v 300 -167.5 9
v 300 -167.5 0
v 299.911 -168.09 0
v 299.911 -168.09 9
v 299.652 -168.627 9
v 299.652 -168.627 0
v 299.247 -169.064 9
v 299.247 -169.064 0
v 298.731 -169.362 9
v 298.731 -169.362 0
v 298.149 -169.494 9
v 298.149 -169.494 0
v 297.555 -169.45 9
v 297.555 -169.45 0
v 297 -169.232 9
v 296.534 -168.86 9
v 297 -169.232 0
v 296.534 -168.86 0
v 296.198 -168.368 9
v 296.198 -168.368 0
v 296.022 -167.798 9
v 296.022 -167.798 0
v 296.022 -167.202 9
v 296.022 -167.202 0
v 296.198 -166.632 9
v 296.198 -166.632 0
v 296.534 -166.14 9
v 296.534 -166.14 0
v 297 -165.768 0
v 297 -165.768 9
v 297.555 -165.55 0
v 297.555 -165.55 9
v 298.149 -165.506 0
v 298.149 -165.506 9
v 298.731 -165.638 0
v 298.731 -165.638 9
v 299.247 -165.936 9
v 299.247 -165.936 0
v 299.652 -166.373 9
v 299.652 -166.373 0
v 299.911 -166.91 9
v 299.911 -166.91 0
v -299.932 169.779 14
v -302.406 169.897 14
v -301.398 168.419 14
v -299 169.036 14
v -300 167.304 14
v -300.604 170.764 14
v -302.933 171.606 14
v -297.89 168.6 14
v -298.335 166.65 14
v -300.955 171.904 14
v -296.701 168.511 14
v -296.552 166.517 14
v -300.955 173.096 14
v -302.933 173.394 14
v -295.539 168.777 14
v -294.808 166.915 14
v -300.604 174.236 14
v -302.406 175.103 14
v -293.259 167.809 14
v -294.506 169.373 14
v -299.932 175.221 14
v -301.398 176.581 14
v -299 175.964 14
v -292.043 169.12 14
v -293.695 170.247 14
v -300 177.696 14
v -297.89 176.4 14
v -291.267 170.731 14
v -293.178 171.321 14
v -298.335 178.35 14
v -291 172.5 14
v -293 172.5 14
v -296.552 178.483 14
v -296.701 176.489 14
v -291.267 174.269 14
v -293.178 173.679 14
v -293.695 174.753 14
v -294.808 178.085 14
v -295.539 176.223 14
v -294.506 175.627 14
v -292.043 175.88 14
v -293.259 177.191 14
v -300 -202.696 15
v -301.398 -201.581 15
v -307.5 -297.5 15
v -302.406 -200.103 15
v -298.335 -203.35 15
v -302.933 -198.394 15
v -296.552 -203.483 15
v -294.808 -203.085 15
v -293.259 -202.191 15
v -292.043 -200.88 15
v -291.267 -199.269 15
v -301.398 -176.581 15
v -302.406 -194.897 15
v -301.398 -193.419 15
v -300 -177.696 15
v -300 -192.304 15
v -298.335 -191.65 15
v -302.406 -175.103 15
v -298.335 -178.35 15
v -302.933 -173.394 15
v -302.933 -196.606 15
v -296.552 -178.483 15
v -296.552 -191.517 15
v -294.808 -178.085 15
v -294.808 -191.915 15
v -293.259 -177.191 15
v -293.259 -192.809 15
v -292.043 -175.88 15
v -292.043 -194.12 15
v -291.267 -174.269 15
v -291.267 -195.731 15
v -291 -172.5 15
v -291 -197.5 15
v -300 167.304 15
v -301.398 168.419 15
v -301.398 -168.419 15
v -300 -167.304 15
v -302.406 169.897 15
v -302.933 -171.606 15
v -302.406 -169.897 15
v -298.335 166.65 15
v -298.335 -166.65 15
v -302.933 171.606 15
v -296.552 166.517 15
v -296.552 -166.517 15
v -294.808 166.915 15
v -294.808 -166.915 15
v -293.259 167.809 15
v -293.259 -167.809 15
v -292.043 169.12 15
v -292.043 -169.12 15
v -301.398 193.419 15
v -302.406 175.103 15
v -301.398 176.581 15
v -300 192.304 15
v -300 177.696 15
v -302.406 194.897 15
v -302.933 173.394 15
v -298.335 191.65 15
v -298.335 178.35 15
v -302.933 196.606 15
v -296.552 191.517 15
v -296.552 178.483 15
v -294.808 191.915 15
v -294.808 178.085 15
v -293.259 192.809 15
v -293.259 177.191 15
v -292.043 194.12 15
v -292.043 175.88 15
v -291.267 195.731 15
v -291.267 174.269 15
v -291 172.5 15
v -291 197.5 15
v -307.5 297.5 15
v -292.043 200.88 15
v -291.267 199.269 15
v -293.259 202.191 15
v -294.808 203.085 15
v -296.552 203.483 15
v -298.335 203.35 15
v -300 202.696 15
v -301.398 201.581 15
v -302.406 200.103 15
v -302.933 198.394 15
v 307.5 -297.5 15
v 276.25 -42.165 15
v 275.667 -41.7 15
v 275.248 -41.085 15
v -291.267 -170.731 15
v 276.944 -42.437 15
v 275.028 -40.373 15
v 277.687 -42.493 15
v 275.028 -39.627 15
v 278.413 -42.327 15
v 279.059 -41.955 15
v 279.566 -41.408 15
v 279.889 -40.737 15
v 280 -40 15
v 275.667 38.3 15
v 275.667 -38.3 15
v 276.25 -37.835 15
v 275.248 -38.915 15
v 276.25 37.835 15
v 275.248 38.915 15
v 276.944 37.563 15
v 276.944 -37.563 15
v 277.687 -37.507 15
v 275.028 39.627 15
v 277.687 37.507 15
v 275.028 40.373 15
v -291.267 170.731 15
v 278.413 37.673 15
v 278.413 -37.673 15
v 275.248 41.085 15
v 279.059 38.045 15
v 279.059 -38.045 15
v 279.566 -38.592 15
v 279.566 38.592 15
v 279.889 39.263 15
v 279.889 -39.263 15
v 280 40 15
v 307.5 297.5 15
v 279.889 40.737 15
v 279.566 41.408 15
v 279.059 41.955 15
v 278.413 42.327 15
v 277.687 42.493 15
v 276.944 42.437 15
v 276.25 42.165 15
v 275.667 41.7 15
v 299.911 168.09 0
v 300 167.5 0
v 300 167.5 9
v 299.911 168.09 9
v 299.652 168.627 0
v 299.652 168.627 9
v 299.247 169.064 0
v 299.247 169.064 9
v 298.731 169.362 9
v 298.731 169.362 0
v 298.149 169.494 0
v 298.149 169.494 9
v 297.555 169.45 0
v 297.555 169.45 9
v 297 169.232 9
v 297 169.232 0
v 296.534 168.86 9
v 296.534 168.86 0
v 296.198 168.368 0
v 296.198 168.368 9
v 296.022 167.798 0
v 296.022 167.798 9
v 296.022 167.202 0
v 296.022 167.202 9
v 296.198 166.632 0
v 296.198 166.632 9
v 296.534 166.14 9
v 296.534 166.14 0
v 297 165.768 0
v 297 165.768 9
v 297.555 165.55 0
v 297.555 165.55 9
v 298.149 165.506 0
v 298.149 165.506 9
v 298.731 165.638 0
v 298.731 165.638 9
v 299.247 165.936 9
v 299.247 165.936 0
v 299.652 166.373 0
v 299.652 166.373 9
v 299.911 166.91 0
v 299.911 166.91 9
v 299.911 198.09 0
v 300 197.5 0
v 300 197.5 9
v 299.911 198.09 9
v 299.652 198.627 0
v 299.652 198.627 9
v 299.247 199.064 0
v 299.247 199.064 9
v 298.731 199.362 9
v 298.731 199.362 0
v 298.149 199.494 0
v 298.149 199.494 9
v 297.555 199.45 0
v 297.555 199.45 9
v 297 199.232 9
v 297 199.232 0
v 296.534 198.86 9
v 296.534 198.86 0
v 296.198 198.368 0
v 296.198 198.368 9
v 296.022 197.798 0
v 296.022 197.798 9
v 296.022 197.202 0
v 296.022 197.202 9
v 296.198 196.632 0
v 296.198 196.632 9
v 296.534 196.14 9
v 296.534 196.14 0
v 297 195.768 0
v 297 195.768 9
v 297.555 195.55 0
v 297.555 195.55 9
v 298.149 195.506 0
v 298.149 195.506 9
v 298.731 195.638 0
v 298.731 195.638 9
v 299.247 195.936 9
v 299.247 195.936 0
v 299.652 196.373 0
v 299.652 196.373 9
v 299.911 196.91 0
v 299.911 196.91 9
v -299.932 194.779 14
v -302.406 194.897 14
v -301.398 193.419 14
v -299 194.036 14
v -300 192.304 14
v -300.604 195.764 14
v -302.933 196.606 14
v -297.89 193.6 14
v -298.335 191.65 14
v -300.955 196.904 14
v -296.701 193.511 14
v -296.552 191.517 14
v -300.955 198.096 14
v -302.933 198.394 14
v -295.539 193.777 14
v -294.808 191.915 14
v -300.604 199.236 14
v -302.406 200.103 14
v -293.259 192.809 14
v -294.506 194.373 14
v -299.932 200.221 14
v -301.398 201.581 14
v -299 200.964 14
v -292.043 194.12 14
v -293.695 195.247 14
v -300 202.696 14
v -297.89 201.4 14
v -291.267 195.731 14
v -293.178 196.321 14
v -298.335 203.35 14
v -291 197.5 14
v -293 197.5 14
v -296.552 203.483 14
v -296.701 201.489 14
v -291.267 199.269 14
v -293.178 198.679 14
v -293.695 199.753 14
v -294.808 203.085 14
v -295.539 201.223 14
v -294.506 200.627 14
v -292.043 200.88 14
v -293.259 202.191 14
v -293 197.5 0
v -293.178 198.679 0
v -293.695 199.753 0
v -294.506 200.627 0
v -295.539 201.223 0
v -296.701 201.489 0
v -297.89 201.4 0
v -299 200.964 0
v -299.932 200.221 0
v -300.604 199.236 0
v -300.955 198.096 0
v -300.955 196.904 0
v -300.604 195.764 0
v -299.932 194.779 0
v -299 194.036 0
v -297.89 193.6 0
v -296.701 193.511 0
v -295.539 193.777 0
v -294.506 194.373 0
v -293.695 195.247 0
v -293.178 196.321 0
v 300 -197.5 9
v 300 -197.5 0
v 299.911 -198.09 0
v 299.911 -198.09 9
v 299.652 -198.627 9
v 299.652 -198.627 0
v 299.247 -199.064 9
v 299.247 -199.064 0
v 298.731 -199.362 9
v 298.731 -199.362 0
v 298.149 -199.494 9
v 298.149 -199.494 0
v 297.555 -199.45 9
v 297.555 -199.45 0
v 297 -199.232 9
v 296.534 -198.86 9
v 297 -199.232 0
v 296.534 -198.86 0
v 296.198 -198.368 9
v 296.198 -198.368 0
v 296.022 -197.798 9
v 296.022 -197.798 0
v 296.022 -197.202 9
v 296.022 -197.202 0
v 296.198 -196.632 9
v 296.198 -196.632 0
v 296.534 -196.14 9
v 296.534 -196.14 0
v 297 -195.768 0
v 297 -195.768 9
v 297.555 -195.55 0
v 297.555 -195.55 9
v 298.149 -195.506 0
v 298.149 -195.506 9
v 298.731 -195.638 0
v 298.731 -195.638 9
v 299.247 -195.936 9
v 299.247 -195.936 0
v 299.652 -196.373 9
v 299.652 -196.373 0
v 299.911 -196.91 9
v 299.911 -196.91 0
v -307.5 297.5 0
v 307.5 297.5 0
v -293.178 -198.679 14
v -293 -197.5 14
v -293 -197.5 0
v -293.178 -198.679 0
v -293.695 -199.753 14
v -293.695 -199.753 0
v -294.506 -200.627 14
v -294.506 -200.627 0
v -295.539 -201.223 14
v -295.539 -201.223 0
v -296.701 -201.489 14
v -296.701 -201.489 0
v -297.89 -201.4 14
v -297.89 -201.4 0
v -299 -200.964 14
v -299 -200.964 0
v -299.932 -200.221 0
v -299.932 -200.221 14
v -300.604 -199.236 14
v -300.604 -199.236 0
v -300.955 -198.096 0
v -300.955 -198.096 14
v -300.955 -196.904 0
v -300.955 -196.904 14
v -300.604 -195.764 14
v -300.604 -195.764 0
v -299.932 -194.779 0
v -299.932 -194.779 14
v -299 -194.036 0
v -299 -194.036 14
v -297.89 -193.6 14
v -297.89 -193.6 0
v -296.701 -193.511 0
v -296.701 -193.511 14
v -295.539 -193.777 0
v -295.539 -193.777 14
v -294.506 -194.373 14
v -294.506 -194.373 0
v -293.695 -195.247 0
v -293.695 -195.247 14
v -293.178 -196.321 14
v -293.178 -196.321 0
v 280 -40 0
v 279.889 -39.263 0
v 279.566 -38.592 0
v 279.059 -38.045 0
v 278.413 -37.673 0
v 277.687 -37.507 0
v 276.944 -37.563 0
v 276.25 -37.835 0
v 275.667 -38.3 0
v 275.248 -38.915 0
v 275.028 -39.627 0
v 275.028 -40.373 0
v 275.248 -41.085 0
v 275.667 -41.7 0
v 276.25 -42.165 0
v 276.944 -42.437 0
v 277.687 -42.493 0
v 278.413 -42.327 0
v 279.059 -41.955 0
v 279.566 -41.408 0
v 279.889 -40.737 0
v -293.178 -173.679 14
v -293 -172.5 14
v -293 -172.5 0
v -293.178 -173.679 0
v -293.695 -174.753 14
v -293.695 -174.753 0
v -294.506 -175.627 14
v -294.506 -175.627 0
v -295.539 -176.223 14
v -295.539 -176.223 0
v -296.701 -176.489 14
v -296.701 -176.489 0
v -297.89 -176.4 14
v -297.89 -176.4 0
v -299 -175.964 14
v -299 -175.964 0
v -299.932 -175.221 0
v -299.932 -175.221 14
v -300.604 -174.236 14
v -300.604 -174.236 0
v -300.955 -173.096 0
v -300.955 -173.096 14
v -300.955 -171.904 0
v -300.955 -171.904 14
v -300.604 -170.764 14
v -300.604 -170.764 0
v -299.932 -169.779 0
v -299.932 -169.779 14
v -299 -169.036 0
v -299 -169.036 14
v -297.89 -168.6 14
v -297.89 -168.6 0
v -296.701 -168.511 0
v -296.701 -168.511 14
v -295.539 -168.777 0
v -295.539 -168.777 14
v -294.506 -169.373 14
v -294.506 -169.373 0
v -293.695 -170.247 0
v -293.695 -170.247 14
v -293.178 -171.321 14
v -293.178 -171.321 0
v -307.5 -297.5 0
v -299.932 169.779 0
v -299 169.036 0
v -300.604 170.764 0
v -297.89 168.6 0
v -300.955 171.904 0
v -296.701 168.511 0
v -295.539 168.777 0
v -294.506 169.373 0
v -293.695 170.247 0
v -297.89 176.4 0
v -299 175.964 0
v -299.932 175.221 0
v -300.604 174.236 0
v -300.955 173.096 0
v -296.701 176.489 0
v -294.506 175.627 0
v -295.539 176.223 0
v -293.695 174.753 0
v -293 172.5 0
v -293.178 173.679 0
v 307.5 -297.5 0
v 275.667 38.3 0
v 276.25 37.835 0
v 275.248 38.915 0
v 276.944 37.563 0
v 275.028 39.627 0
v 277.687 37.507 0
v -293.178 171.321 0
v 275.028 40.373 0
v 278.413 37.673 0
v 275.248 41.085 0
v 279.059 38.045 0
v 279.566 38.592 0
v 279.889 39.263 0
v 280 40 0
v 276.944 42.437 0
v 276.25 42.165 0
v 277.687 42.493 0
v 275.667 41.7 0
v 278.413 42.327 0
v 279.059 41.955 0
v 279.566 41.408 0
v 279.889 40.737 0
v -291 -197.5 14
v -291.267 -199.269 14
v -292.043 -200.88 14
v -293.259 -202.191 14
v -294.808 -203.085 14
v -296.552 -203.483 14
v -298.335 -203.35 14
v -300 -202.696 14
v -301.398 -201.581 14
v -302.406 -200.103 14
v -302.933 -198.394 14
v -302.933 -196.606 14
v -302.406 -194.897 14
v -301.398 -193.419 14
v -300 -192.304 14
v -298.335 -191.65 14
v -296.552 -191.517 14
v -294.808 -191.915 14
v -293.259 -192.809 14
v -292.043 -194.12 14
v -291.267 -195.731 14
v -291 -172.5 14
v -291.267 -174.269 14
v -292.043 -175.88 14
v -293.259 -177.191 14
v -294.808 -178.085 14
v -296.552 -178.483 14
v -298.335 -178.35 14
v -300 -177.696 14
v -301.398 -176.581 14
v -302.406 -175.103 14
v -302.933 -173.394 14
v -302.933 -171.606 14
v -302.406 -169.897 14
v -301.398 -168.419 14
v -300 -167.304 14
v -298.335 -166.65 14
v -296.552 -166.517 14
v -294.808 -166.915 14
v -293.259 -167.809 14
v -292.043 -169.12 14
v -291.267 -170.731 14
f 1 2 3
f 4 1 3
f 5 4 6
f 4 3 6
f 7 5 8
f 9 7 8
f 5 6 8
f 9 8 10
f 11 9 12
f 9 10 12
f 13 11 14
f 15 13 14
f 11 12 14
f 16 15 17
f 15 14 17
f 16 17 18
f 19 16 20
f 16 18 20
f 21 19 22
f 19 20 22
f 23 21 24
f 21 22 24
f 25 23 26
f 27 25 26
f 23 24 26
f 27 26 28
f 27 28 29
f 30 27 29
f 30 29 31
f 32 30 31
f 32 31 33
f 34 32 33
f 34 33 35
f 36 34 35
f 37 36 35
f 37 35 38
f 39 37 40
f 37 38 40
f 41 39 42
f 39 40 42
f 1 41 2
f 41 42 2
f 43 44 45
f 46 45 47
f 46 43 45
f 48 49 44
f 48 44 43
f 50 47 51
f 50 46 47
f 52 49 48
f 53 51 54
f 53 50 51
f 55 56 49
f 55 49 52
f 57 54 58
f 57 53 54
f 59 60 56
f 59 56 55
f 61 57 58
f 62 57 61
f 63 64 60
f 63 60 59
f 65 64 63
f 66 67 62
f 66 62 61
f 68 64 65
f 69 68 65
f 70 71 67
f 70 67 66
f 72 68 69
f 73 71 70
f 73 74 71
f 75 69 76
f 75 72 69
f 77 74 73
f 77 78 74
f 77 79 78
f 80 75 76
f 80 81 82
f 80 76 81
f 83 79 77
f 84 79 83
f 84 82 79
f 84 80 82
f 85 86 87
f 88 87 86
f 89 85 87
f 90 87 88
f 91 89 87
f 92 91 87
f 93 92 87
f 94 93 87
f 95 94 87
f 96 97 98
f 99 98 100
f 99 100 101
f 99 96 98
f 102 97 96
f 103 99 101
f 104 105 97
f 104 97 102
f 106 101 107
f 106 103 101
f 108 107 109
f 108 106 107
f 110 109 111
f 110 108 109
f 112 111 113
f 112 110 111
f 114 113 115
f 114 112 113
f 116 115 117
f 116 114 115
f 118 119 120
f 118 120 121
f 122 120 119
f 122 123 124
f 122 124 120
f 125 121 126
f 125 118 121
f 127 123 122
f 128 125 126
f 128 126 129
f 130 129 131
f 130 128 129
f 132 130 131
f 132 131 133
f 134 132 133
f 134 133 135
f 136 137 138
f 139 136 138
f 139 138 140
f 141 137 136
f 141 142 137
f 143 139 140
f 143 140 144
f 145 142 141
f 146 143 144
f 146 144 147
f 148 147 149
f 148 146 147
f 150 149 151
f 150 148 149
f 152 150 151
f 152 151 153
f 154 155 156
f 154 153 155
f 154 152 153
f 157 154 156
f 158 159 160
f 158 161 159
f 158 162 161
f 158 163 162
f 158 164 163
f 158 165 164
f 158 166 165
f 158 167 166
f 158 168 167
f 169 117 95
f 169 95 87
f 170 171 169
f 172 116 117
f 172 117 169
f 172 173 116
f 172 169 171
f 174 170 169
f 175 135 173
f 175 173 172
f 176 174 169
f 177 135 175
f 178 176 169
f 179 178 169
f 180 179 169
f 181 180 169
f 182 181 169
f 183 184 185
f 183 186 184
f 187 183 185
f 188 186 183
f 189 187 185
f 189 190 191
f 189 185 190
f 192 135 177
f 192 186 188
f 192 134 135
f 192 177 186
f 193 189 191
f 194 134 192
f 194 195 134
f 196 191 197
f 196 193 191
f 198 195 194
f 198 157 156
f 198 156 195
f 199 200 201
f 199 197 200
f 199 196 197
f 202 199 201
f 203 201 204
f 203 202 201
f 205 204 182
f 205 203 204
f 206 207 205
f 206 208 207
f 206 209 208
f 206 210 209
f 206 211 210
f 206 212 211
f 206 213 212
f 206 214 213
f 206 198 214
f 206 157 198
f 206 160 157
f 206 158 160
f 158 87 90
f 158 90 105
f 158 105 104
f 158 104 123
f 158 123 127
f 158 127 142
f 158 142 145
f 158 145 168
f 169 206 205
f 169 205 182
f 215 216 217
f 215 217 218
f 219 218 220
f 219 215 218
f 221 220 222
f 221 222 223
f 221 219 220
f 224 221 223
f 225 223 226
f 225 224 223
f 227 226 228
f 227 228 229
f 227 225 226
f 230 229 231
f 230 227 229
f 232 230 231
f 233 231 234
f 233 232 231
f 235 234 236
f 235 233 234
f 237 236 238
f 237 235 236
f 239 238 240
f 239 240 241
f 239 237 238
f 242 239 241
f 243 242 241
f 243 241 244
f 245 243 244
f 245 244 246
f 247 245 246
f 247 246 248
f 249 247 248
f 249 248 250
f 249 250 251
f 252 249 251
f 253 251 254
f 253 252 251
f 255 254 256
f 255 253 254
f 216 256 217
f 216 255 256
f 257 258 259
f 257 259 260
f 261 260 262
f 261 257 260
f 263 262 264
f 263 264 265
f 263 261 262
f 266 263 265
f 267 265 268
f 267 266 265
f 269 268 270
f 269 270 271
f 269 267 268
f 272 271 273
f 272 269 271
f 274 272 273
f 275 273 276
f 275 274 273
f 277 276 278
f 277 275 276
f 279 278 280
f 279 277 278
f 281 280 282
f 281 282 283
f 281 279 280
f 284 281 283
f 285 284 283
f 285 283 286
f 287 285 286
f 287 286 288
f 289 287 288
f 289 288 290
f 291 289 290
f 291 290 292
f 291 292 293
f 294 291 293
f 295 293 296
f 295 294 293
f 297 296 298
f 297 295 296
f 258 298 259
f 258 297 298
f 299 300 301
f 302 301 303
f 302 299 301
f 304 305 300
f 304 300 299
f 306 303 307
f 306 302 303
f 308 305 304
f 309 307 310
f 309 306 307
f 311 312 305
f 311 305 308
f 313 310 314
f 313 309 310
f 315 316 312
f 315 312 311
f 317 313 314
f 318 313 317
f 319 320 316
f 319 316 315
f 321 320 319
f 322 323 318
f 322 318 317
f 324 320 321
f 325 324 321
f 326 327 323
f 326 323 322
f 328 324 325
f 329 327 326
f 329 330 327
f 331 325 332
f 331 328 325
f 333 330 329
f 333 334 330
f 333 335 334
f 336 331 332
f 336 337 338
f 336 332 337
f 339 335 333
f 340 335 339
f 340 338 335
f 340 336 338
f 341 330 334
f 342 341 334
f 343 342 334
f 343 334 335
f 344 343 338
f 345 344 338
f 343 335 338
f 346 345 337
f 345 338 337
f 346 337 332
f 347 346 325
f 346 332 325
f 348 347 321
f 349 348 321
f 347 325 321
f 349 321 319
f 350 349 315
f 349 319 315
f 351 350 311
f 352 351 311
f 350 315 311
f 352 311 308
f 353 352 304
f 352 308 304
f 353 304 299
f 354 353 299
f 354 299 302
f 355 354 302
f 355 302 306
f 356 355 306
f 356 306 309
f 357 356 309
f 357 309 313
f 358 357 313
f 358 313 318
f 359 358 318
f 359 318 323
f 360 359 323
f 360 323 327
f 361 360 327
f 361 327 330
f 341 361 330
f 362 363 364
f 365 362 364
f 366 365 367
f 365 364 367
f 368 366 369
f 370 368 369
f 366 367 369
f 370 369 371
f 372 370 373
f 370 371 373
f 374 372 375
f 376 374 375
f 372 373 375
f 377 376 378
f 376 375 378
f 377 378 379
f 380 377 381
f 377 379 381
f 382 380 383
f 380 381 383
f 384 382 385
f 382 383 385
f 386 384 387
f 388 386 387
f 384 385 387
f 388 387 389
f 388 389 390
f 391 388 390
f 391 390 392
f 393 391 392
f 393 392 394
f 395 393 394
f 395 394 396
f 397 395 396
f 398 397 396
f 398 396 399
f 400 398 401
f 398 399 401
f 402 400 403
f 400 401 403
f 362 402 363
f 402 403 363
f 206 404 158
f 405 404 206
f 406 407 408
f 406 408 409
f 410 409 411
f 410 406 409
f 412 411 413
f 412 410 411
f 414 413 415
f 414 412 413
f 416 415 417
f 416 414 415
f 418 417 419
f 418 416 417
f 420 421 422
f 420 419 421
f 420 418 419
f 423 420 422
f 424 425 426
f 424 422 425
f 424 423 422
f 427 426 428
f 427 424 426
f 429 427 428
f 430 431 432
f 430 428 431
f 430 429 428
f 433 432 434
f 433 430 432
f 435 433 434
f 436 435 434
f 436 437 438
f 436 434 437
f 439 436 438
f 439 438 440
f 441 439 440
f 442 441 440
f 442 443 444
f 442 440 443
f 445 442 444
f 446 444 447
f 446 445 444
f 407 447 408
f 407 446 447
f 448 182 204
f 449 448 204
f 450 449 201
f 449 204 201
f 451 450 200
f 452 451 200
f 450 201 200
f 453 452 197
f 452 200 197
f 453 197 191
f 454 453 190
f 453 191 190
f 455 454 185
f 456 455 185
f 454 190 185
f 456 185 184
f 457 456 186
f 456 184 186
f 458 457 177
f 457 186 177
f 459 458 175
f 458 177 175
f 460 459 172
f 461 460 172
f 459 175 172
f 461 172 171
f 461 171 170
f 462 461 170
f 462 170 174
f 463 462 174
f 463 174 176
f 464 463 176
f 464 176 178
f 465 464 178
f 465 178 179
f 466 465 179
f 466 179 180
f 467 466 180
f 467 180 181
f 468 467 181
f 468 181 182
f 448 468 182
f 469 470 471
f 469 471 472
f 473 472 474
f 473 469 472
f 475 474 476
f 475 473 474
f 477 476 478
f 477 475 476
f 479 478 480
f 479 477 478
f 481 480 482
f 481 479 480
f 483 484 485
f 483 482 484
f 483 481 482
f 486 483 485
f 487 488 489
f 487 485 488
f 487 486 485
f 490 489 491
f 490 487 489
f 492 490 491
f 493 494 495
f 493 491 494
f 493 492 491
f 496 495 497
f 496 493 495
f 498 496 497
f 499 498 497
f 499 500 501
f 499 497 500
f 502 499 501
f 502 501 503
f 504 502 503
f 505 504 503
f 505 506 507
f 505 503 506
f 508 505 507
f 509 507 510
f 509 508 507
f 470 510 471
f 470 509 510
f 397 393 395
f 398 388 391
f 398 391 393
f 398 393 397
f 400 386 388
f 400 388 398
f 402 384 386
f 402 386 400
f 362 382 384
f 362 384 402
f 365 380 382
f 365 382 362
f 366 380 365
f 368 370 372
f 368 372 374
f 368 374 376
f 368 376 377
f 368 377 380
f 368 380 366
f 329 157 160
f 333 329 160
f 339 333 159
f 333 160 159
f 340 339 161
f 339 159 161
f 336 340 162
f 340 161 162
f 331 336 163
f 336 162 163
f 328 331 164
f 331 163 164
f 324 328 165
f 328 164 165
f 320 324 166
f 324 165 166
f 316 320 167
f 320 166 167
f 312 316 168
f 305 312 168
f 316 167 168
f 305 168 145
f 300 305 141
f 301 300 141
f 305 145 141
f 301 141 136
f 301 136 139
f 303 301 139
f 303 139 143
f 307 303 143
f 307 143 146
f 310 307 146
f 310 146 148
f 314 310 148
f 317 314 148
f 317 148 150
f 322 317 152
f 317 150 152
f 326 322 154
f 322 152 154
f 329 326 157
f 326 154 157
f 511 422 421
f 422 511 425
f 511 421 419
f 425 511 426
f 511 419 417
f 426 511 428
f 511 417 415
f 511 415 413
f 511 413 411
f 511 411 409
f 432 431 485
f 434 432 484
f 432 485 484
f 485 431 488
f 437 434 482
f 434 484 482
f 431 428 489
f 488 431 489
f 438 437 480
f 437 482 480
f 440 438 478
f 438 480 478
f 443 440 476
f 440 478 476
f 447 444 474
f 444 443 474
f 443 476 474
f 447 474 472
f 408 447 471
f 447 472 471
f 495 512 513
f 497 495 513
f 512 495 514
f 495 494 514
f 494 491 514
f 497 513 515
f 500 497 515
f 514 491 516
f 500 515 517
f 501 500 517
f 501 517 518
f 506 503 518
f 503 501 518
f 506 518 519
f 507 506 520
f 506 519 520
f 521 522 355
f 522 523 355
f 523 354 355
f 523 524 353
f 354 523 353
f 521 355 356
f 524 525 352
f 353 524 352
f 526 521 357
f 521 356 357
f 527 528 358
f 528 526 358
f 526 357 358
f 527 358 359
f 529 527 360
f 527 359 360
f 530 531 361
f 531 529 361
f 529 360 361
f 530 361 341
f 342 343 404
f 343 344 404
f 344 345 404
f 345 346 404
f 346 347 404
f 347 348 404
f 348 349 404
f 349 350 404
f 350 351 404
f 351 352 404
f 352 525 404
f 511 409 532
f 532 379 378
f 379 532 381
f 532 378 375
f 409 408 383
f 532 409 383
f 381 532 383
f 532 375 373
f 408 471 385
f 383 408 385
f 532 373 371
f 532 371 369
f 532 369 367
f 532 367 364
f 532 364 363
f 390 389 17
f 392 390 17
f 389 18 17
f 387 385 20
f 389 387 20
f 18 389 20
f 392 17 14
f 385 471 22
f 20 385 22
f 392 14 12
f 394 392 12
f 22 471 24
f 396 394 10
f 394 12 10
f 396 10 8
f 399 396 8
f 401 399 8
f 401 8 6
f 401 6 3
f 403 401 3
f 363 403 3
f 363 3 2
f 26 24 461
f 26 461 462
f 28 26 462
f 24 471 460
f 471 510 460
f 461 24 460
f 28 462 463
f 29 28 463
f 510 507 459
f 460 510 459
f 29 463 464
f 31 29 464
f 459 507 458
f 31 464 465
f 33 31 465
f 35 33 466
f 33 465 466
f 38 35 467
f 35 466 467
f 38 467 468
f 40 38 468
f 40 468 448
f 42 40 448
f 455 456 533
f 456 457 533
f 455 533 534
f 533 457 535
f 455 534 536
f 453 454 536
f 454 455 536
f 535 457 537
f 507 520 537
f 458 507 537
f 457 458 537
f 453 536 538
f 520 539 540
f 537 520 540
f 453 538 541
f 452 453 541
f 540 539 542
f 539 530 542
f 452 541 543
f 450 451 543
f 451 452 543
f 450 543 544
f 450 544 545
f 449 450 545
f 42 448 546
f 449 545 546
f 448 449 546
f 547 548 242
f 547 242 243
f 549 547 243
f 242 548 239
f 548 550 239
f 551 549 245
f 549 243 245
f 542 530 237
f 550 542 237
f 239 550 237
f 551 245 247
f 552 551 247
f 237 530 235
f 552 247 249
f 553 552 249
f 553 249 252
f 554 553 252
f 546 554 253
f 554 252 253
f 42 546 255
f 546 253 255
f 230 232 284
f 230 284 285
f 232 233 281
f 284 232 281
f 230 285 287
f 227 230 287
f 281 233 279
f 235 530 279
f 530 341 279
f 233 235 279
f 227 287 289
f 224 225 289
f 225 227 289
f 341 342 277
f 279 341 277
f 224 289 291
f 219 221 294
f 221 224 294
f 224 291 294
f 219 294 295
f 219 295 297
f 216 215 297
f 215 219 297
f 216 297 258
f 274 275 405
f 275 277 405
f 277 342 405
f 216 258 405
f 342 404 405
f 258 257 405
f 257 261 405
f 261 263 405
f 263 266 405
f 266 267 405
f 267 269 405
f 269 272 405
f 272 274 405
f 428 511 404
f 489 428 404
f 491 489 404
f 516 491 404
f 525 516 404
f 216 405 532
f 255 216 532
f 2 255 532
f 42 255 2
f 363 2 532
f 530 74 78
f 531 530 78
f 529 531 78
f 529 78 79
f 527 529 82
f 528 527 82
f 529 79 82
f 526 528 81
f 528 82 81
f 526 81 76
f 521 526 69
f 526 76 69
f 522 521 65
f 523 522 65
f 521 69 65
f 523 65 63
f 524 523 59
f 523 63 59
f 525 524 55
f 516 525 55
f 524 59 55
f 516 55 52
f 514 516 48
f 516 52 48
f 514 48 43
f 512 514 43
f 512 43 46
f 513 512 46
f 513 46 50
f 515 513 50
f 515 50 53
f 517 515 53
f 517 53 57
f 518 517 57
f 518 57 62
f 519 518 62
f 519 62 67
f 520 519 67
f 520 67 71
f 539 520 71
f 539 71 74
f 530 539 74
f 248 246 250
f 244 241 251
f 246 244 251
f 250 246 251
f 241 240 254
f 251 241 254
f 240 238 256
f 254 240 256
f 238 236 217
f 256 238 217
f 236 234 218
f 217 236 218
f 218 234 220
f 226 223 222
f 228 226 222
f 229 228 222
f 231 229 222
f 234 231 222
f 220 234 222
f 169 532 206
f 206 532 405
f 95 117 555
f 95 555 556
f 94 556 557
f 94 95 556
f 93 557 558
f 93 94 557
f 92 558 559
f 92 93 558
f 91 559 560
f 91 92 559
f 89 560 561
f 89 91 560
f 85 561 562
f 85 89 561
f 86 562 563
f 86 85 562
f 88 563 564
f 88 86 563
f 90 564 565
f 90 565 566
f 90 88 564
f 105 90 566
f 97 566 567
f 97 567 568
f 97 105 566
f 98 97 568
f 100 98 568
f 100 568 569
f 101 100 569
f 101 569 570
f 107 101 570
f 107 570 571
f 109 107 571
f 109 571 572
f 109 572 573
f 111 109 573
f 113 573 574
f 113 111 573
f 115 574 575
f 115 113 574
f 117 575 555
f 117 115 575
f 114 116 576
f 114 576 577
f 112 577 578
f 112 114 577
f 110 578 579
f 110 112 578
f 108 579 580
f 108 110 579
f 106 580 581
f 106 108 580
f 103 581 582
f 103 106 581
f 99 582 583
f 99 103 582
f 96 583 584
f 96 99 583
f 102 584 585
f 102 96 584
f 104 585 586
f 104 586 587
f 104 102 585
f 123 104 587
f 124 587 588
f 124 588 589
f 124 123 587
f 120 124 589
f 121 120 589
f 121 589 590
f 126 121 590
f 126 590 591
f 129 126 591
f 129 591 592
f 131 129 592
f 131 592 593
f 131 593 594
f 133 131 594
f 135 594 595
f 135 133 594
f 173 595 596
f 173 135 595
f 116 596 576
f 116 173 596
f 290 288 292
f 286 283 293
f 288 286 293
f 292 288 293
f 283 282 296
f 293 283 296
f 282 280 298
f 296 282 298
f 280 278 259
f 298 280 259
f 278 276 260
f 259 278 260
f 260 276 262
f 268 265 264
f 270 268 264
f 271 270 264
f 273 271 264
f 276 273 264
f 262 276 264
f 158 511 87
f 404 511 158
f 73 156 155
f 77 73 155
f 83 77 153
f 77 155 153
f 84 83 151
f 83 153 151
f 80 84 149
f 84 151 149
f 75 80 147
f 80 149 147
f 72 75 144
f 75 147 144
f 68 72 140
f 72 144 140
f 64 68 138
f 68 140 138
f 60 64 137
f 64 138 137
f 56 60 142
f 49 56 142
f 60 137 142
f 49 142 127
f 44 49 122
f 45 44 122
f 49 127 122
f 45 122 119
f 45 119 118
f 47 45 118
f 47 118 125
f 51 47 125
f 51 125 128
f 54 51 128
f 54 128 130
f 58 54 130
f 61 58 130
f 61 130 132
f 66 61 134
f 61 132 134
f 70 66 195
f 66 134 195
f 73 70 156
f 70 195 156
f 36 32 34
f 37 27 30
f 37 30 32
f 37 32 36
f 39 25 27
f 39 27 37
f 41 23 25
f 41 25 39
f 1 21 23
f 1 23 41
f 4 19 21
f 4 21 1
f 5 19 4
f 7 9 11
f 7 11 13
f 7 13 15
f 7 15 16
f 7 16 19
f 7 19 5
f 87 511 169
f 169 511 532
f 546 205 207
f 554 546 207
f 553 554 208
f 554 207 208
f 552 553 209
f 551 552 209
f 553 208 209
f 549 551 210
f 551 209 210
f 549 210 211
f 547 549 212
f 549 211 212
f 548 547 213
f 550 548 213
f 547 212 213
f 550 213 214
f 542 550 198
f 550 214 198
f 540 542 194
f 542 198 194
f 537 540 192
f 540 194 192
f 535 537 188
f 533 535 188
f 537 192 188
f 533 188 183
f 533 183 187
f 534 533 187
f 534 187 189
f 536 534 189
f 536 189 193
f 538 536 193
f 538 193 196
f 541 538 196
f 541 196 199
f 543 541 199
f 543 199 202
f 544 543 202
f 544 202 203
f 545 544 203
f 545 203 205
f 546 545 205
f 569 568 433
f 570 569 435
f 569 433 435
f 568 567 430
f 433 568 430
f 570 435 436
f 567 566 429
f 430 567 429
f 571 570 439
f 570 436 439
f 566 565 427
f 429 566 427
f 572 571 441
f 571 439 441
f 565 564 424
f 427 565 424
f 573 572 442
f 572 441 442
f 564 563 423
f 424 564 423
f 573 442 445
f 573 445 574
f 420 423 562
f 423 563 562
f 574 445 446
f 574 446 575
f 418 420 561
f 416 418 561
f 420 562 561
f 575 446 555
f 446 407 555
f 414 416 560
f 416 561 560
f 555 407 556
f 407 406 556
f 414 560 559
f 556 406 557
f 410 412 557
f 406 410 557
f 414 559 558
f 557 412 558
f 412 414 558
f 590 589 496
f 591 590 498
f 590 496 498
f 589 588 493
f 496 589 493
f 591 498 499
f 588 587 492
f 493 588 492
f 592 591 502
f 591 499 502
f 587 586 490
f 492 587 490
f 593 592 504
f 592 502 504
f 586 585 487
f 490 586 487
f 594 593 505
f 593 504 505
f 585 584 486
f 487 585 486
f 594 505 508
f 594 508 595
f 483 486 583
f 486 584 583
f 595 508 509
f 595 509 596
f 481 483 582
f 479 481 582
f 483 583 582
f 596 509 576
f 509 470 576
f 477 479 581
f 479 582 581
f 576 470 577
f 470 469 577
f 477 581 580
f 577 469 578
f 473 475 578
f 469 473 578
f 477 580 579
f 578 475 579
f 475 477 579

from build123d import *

# Parameters (mm, degrees)
SKETCH_1_W          = 615
SKETCH_1_H          = 595
EXTRUDE_1_DEPTH     = 15
SKETCH_2_R          = 4
CUT_EXTRUDE_2_DEPTH = 16
SKETCH_3_R          = 6
CUT_EXTRUDE_4_DEPTH = 1
SKETCH_4_R          = 2.5
CUT_EXTRUDE_5_DEPTH = 16
SKETCH_5_R          = 2
CUT_EXTRUDE_6_DEPTH = 9


with BuildPart() as part:
    # Sketch 1 → Extrude 1 (new body)
    with BuildSketch(Plane.XY):
        Rectangle(SKETCH_1_W, SKETCH_1_H)
    extrude(amount=EXTRUDE_1_DEPTH)

    # Sketch 2 → Cut-Extrude 2 (cut, through all)
    with BuildSketch(Plane.XY.offset(15)):
        with Locations((-297, 197.5)):
            Circle(SKETCH_2_R)
        with Locations((-297, 172.5)):
            Circle(SKETCH_2_R)
    cut_extrude_2 = extrude(amount=-CUT_EXTRUDE_2_DEPTH, mode=Mode.SUBTRACT)

    # Mirror 2: Cut-Extrude 2 across plane
    add(cut_extrude_2.mirror(Plane.ZX), mode=Mode.SUBTRACT)

    # Sketch 3 → Cut-Extrude 4 (cut)
    with BuildSketch(Plane.XY.offset(15)):
        with Locations((-297, 197.5)):
            Circle(SKETCH_3_R)
        with Locations((-297, 172.5)):
            Circle(SKETCH_3_R)
    cut_extrude_4 = extrude(amount=-CUT_EXTRUDE_4_DEPTH, mode=Mode.SUBTRACT)

    # Mirror 4: Cut-Extrude 4 across plane
    add(cut_extrude_4.mirror(Plane.ZX), mode=Mode.SUBTRACT)

    # Sketch 4 → Cut-Extrude 5 (cut, through all)
    with BuildSketch(Plane.XY.offset(15)):
        with Locations((277.5, 40)):
            Circle(SKETCH_4_R)
        with Locations((277.5, -40)):
            Circle(SKETCH_4_R)
    extrude(amount=-CUT_EXTRUDE_5_DEPTH, mode=Mode.SUBTRACT)

    # Sketch 5 → Cut-Extrude 6 (cut)
    with BuildSketch(Plane.XY):
        with Locations((298, 197.5)):
            Circle(SKETCH_5_R)
        with Locations((298, 167.5)):
            Circle(SKETCH_5_R)
    cut_extrude_6 = extrude(amount=CUT_EXTRUDE_6_DEPTH, mode=Mode.SUBTRACT)

    # Mirror 5: Cut-Extrude 6 across plane
    add(cut_extrude_6.mirror(Plane.ZX), mode=Mode.SUBTRACT)


solid = part.part
